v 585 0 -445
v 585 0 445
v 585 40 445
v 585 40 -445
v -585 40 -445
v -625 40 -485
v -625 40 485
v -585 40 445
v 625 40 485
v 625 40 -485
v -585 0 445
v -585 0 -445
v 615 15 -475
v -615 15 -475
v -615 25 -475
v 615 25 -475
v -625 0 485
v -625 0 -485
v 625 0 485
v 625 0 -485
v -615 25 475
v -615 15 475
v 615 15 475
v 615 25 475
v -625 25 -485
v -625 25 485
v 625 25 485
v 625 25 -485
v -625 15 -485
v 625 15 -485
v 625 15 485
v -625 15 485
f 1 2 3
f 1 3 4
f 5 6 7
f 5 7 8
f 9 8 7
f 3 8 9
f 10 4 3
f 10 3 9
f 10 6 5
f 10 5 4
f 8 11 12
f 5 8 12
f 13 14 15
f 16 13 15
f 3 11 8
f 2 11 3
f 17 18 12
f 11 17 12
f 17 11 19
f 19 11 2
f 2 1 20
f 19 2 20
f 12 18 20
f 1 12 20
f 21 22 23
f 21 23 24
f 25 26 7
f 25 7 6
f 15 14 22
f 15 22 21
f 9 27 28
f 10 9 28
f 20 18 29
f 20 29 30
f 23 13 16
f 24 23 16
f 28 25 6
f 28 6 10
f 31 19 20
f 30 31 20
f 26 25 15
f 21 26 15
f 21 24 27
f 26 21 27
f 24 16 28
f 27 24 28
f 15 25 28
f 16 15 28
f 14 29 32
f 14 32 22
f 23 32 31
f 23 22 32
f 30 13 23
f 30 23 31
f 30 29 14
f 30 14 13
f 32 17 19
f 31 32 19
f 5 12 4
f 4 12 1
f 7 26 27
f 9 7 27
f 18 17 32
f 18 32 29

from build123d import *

# Parameters (mm, degrees)
SKETCH1_W               = 1250
SKETCH1_H               = 970
SKETCH1_W_2             = 1170
SKETCH1_H_2             = 890
BOSS_EXTRUDE1_DEPTH     = 40
CUT_EXTRUDE1_DEPTH      = 1155.610323876
CUT_EXTRUDE1_DEPTH_BACK = 1155.610323876
SKETCH2_W               = 10
SKETCH2_H               = 10
CUT_EXTRUDE2_DEPTH      = 1342.389205264
CUT_EXTRUDE2_DEPTH_BACK = 1342.389205264
SKETCH3_W               = 10
SKETCH3_H               = 10


with BuildPart() as part:
    # Sketch1 → Boss-Extrude1 (new body)
    with BuildSketch(Plane(origin=(0, 0, 0), x_dir=(1, 0, 0), z_dir=(0, 1, 0))):
        Rectangle(SKETCH1_W, SKETCH1_H)
        Rectangle(SKETCH1_W_2, SKETCH1_H_2, mode=Mode.SUBTRACT)
    extrude(amount=BOSS_EXTRUDE1_DEPTH)

    # Sketch2 → Cut-Extrude1 (cut, two sides: drawn at the far end of the back side and taken through both)
    with BuildSketch(Plane.XY.offset(485).offset(-CUT_EXTRUDE1_DEPTH_BACK)):
        with Locations((-620, 20)):
            Rectangle(SKETCH2_W, SKETCH2_H)
        with Locations((620, 20)):
            Rectangle(SKETCH2_W, SKETCH2_H)
    extrude(amount=CUT_EXTRUDE1_DEPTH + CUT_EXTRUDE1_DEPTH_BACK, mode=Mode.SUBTRACT)

    # Sketch3 → Cut-Extrude2 (cut, two sides: drawn at the far end of the back side and taken through both)
    with BuildSketch(Plane.ZY.offset(625).offset(-CUT_EXTRUDE2_DEPTH_BACK)):
        with Locations((480, 20)):
            Rectangle(SKETCH3_W, SKETCH3_H)
        with Locations((-480, 20)):
            Rectangle(SKETCH3_W, SKETCH3_H)
    extrude(amount=CUT_EXTRUDE2_DEPTH + CUT_EXTRUDE2_DEPTH_BACK, mode=Mode.SUBTRACT)


solid = part.part
